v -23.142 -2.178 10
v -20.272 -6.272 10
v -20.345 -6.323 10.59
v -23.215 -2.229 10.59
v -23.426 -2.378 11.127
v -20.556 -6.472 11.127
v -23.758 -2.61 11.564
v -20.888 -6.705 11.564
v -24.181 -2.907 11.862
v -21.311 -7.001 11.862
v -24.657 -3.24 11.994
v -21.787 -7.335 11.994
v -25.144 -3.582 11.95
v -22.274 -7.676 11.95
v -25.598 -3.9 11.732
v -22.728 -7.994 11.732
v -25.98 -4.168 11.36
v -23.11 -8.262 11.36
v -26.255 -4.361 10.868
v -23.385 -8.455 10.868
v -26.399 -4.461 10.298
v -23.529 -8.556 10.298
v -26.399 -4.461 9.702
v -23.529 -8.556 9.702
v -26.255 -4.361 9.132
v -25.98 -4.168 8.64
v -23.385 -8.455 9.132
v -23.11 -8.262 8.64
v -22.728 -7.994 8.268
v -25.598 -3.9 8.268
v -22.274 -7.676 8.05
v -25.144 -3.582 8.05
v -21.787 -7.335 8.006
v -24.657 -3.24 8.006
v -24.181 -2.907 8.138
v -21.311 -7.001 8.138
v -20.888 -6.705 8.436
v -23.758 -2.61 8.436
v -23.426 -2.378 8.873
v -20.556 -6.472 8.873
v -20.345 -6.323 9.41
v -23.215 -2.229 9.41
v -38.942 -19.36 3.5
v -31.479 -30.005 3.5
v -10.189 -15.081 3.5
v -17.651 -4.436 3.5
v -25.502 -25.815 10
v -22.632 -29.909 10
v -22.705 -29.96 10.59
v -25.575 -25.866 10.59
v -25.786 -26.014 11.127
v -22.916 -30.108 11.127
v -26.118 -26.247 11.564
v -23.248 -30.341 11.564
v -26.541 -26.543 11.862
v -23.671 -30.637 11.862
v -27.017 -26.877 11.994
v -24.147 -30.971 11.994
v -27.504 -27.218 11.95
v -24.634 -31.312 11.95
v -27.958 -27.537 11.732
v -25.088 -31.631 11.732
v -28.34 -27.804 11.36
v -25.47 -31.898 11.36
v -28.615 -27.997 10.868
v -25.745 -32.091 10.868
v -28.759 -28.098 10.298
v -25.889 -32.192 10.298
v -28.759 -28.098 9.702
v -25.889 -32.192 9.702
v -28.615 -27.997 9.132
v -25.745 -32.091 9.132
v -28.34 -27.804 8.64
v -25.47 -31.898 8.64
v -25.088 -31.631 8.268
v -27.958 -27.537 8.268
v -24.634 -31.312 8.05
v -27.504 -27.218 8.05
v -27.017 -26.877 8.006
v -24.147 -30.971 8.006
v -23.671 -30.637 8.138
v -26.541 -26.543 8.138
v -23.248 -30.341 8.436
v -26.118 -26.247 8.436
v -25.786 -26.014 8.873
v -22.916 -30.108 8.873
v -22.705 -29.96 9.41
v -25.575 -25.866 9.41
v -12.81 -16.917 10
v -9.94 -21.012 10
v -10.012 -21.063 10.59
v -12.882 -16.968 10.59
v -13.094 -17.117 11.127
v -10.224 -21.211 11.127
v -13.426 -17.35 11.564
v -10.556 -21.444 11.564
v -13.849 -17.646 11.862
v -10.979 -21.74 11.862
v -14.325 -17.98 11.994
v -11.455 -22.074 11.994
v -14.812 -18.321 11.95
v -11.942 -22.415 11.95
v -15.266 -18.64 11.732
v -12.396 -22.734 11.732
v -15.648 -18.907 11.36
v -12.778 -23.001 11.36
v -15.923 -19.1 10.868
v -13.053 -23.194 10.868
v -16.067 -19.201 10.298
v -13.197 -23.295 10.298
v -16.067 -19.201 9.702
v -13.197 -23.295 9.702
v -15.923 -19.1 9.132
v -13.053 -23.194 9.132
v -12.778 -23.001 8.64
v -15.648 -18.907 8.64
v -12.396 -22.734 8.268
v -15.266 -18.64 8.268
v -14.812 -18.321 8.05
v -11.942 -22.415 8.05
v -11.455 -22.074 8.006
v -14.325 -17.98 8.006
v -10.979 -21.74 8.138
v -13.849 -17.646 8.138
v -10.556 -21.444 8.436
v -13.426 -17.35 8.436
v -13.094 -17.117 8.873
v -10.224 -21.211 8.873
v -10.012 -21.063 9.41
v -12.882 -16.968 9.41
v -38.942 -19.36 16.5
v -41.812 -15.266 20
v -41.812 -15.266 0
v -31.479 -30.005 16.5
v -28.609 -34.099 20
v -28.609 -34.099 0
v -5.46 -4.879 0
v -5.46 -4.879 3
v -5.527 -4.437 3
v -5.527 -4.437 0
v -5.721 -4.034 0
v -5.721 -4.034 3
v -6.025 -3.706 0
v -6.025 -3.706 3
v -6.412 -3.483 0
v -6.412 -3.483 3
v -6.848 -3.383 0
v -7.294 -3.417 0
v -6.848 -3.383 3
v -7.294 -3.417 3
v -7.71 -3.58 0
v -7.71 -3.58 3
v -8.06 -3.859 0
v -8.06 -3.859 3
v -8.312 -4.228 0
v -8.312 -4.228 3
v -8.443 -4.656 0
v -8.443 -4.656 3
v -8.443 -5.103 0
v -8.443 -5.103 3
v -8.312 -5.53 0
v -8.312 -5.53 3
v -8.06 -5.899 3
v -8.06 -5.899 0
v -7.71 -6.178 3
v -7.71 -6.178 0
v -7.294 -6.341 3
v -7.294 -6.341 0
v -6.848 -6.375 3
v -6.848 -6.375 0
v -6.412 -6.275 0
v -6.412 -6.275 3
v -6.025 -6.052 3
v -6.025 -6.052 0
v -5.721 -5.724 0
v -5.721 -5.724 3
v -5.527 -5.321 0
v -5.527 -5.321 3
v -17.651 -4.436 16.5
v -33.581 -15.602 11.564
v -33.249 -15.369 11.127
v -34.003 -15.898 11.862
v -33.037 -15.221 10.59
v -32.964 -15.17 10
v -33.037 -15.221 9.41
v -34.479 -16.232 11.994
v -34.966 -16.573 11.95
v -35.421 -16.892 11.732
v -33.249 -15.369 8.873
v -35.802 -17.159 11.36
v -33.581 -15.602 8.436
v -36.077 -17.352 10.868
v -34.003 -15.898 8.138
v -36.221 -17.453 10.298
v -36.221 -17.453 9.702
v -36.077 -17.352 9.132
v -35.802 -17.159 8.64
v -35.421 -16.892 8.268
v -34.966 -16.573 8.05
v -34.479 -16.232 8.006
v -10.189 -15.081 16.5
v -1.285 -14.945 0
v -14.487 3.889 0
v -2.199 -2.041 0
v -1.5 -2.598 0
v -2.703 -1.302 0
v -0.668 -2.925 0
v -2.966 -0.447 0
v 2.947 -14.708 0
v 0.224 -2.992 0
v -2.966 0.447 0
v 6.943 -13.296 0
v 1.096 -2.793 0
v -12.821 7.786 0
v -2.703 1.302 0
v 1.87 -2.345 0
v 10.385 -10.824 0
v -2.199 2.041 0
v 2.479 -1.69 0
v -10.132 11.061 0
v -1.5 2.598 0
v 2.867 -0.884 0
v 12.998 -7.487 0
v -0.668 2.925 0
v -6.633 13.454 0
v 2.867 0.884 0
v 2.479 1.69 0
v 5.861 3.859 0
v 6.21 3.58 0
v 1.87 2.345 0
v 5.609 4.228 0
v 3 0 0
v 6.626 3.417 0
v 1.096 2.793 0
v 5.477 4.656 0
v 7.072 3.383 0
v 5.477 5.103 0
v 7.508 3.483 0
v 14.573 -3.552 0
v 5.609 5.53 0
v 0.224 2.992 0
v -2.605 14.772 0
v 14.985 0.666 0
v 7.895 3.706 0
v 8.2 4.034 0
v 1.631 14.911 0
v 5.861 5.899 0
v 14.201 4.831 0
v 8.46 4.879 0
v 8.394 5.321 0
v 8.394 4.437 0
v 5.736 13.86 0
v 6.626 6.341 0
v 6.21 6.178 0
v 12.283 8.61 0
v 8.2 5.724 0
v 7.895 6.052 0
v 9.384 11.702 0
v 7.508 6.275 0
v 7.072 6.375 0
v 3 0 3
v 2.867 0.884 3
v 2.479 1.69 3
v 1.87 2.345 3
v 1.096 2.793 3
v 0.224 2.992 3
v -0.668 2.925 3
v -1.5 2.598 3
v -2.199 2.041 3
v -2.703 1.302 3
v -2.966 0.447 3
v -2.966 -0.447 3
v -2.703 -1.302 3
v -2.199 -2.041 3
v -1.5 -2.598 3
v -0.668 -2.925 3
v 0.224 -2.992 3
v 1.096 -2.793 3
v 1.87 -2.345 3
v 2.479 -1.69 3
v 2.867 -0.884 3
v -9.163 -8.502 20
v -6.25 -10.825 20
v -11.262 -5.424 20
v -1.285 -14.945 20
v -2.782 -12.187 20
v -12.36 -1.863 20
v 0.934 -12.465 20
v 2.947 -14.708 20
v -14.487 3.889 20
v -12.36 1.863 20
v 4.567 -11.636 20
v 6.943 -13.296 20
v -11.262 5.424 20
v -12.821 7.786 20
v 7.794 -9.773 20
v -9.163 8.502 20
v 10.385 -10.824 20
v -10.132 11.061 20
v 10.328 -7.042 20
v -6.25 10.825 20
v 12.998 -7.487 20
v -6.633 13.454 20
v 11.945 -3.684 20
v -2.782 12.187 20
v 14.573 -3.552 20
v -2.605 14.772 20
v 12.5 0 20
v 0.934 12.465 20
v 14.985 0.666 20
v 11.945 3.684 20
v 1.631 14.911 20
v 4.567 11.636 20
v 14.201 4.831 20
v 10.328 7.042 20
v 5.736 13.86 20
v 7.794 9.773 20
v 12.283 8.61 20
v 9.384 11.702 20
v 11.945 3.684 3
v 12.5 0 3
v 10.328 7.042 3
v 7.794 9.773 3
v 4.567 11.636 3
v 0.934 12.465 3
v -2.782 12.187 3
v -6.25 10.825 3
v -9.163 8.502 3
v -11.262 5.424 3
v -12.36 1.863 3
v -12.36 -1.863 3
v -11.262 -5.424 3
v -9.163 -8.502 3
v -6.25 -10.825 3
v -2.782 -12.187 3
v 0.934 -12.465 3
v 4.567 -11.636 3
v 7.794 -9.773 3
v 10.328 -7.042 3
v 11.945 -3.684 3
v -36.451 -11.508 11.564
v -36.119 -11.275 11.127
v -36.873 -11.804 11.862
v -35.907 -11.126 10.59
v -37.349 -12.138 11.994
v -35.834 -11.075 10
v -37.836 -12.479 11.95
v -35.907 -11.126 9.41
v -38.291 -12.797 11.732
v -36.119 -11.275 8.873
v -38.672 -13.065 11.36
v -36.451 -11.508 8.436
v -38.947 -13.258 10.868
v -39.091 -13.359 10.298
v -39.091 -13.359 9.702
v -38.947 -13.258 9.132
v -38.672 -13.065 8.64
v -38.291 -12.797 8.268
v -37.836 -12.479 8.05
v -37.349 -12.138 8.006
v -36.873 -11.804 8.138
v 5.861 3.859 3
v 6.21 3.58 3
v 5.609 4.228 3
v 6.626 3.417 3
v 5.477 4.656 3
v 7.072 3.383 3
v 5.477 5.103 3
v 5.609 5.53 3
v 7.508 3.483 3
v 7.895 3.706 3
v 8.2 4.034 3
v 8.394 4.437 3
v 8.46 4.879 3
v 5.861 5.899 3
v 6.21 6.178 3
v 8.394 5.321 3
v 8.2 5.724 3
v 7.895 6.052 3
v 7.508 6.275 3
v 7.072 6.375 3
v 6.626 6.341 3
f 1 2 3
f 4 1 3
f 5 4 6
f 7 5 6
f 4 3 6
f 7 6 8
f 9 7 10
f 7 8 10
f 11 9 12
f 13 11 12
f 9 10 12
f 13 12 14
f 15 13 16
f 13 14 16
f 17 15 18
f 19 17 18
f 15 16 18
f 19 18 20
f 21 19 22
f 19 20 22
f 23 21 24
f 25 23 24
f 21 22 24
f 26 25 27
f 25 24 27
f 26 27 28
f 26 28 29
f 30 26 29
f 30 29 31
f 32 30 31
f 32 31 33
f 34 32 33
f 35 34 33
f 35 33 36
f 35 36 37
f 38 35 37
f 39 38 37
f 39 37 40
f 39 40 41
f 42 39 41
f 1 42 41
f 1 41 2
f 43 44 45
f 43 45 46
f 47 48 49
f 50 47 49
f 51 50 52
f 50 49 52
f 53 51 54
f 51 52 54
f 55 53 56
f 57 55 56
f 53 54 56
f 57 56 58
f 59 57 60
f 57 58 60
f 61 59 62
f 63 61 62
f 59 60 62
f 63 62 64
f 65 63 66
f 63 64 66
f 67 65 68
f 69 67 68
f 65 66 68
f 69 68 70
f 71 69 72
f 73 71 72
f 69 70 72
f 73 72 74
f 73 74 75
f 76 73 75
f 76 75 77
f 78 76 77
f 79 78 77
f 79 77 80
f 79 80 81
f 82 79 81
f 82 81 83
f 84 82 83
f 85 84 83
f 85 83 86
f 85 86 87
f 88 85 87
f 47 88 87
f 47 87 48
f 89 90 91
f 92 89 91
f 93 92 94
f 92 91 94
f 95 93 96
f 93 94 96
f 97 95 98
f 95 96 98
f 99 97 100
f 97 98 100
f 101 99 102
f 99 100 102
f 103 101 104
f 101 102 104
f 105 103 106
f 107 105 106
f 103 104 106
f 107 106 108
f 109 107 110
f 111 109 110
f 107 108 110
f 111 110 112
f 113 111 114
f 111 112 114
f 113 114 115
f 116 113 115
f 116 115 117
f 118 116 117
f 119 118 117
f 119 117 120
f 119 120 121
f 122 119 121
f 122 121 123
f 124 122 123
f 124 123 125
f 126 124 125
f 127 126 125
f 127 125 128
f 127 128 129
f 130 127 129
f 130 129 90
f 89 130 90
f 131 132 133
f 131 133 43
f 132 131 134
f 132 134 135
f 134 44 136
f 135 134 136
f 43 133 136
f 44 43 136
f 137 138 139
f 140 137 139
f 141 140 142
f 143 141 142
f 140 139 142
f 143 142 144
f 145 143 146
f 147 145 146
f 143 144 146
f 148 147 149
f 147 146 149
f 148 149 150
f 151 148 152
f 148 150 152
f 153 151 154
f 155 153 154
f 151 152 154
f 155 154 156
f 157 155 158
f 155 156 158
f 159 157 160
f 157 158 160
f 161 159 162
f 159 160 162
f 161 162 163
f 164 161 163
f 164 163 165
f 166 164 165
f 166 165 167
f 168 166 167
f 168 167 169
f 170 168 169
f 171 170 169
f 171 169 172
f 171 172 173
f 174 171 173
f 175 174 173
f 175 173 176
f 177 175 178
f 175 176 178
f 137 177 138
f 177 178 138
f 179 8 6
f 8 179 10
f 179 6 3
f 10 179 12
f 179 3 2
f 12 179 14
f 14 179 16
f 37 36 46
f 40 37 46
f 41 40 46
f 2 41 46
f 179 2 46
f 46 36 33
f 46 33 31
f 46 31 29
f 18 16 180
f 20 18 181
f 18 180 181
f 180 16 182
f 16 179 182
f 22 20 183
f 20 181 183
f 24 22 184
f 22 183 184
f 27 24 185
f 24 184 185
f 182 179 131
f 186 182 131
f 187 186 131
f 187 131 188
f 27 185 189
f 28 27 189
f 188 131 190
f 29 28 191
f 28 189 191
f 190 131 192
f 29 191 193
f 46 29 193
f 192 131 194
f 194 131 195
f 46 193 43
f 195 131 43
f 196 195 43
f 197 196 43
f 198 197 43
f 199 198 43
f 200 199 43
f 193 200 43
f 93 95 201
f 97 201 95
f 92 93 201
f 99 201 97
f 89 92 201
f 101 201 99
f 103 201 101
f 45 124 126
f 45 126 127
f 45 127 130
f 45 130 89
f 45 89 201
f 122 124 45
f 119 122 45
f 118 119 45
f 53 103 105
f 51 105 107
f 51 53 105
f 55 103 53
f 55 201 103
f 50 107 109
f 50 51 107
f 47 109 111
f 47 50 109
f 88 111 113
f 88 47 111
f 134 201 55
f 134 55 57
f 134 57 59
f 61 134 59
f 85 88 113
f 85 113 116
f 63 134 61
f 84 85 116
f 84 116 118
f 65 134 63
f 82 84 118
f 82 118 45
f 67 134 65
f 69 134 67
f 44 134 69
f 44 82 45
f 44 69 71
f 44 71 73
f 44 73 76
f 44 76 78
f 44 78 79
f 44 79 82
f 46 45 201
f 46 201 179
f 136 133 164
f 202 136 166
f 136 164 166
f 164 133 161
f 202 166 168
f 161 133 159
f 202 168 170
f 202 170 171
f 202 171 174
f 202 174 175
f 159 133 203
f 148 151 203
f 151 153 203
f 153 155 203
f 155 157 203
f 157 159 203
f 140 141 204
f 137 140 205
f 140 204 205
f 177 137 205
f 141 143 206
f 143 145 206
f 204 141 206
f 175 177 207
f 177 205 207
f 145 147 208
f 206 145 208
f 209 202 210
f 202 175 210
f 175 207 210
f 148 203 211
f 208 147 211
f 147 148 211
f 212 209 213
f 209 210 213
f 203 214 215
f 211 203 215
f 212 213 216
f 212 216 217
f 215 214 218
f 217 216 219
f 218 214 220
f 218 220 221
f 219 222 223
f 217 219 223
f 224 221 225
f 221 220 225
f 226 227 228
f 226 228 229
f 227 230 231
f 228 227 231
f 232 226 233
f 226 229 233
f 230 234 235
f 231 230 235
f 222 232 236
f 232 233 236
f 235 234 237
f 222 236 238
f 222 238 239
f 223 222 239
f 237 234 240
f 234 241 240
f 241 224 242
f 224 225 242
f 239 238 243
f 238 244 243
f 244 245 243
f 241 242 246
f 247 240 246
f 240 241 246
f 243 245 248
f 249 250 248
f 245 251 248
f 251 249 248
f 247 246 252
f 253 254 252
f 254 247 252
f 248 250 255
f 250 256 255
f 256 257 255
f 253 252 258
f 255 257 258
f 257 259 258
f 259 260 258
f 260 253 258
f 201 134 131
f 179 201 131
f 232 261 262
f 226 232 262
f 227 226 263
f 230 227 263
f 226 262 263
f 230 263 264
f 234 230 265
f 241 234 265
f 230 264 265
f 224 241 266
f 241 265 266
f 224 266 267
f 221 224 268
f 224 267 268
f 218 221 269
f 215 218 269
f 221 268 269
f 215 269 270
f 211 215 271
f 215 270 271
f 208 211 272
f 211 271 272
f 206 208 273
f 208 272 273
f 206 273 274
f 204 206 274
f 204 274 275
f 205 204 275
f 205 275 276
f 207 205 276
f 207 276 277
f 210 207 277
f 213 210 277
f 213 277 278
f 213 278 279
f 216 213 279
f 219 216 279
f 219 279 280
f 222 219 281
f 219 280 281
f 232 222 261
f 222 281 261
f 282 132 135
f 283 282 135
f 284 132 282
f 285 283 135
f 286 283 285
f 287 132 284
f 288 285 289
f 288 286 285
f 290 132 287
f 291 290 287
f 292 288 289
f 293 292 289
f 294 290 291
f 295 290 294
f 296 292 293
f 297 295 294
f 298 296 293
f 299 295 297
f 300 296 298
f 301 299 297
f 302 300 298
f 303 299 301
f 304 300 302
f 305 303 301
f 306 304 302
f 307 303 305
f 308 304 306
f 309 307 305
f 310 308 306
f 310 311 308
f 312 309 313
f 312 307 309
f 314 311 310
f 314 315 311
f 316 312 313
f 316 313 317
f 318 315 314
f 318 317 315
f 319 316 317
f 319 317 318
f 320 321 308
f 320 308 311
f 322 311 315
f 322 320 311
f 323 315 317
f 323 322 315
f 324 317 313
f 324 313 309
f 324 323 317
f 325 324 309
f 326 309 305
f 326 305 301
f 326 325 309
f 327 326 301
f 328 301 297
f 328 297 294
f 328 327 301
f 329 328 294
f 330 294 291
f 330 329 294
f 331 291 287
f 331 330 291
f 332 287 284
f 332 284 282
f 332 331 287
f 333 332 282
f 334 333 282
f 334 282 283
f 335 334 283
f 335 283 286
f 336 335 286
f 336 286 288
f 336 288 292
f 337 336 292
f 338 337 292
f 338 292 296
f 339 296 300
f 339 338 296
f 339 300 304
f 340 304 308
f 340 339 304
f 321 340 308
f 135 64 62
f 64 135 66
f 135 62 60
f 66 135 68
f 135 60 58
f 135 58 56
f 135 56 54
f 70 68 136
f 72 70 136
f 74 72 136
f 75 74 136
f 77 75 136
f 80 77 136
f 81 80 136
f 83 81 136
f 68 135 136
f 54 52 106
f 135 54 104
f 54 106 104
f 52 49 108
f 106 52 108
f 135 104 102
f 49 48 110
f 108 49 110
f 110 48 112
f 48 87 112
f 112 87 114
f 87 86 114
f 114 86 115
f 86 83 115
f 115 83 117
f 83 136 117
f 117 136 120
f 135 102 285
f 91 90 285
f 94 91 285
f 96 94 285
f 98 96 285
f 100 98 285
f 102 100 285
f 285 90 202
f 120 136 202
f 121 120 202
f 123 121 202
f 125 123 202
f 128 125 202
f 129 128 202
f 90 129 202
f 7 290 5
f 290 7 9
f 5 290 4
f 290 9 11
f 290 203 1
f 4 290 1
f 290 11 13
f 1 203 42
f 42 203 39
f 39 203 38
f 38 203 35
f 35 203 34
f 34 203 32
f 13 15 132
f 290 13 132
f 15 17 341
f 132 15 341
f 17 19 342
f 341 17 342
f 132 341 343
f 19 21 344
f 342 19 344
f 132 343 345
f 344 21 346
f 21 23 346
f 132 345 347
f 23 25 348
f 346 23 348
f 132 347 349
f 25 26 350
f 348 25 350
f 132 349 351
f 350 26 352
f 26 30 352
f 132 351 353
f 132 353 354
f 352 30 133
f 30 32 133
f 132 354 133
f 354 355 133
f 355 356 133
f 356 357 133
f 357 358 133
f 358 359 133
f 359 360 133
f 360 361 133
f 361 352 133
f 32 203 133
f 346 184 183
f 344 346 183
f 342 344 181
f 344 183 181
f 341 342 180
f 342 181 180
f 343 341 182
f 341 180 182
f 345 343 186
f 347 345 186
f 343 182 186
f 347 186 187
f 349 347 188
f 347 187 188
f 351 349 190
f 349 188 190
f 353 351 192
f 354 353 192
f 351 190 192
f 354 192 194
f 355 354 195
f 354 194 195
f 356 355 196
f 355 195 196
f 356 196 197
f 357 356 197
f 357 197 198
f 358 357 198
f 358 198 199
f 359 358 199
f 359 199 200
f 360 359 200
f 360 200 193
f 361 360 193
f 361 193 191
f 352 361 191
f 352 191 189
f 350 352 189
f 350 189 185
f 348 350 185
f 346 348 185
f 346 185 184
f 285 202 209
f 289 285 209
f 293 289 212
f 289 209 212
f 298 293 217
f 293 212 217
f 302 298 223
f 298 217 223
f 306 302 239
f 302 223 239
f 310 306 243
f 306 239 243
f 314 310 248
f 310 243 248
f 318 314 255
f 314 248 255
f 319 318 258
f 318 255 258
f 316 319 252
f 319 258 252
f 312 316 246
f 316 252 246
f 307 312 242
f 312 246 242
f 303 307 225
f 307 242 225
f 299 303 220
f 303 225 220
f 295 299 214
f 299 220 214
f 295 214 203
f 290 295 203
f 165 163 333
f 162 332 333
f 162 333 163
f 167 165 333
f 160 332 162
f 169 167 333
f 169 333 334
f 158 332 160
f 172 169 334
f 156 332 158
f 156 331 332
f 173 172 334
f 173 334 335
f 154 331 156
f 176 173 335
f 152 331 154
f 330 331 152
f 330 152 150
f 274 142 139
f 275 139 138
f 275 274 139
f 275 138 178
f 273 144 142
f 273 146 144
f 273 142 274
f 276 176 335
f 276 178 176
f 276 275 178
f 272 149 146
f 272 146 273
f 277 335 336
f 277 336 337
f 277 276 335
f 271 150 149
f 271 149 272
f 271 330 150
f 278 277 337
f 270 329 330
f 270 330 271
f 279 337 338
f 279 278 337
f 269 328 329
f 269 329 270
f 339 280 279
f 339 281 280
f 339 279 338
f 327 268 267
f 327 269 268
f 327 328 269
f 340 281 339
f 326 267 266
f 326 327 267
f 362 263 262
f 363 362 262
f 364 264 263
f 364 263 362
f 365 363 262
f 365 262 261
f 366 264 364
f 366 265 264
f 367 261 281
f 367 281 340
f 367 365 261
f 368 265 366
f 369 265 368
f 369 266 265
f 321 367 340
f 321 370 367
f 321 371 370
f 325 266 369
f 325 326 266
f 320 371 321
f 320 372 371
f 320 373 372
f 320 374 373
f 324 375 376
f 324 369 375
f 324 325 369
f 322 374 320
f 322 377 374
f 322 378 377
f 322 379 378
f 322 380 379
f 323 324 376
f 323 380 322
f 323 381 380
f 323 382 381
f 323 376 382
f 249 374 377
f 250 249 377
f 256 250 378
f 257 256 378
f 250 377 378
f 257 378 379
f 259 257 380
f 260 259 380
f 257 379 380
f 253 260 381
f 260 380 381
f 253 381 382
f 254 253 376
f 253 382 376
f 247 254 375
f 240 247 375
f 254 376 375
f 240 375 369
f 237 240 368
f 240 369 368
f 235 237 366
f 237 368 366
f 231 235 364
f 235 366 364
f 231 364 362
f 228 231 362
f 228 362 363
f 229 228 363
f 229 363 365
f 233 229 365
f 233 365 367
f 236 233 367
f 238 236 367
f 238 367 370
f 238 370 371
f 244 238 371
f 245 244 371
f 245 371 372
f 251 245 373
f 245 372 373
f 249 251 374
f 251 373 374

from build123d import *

# Parameters (mm, degrees)
SKETCH1_R           = 15
BOSS_EXTRUDE1_DEPTH = 3
SKETCH2_R           = 15
SKETCH2_R_2         = 12.5
BOSS_EXTRUDE2_DEPTH = 17
SKETCH3_R           = 3
SKETCH3_R_2         = 1.5
CUT_EXTRUDE1_DEPTH  = 3
BOSS_EXTRUDE3_DEPTH = 20
SKETCH6_W           = 13
SKETCH6_H           = 13
CUT_EXTRUDE3_DEPTH  = 26
SKETCH7_R           = 2
CUT_EXTRUDE4_DEPTH  = 58.905178378


with BuildPart() as part:
    # Sketch1 → Boss-Extrude1 (new body)
    with BuildSketch(Plane.XY):
        Circle(SKETCH1_R)
    extrude(amount=BOSS_EXTRUDE1_DEPTH)

    # Sketch2 → Boss-Extrude2 (add)
    with BuildSketch(Plane.XY.offset(3)):
        Circle(SKETCH2_R)
        Circle(SKETCH2_R_2, mode=Mode.SUBTRACT)
    extrude(amount=BOSS_EXTRUDE2_DEPTH)

    # Sketch3 → Cut-Extrude1 (cut)
    with BuildSketch(Plane.XY.offset(3)):
        Circle(SKETCH3_R)
        with Locations((-6.960222154, -4.87906831)):
            Circle(SKETCH3_R_2)
        with Locations((6.960222154, 4.87906831)):
            Circle(SKETCH3_R_2)
    extrude(amount=-CUT_EXTRUDE1_DEPTH, mode=Mode.SUBTRACT)

    # Sketch4 → Boss-Extrude3 (add)
    with BuildSketch(Plane(origin=(0, 0, 0), x_dir=(-1, 0, 0), z_dir=(0, 0, -1))):
        with BuildLine():
            Line((14.487171628, 3.888683351), (41.81162802, -15.265574417))
            Line((41.81162802, -15.265574417), (28.609443183, -34.099116715))
            Line((28.609443183, -34.099116715), (1.284986791, -14.944858947))
            ThreePointArc((1.284986791, -14.944858947), (12.282744977, -8.610120546), (14.487171628, 3.888683351))
        make_face()
    extrude(amount=-BOSS_EXTRUDE3_DEPTH)

    # Sketch6 → Cut-Extrude3 (cut)
    with BuildSketch(Plane(origin=(-35.210535602, -24.682345566, 0), x_dir=(-0.5740080364217665, 0.8188496651542504, 0), z_dir=(-0.8188496651542504, -0.5740080364217665, 0))):
        with Locations((0, -10)):
            Rectangle(SKETCH6_W, SKETCH6_H)
    extrude(amount=-CUT_EXTRUDE3_DEPTH, mode=Mode.SUBTRACT)

    # Sketch7 → Cut-Extrude4 (cut, through all)
    with BuildSketch(Plane(origin=(6.601092419, -9.416771149, 0), x_dir=(0, 0, 1), z_dir=(0.5740080364217666, -0.8188496651542504, 0))):
        with Locations(Location((10, 37.7, 0), (0, 0, 270))):
            Circle(SKETCH7_R)
        with Locations(Location((10, 22.2, 0), (0, 0, 270))):
            Circle(SKETCH7_R)
    extrude(amount=-CUT_EXTRUDE4_DEPTH, mode=Mode.SUBTRACT)


solid = part.part
